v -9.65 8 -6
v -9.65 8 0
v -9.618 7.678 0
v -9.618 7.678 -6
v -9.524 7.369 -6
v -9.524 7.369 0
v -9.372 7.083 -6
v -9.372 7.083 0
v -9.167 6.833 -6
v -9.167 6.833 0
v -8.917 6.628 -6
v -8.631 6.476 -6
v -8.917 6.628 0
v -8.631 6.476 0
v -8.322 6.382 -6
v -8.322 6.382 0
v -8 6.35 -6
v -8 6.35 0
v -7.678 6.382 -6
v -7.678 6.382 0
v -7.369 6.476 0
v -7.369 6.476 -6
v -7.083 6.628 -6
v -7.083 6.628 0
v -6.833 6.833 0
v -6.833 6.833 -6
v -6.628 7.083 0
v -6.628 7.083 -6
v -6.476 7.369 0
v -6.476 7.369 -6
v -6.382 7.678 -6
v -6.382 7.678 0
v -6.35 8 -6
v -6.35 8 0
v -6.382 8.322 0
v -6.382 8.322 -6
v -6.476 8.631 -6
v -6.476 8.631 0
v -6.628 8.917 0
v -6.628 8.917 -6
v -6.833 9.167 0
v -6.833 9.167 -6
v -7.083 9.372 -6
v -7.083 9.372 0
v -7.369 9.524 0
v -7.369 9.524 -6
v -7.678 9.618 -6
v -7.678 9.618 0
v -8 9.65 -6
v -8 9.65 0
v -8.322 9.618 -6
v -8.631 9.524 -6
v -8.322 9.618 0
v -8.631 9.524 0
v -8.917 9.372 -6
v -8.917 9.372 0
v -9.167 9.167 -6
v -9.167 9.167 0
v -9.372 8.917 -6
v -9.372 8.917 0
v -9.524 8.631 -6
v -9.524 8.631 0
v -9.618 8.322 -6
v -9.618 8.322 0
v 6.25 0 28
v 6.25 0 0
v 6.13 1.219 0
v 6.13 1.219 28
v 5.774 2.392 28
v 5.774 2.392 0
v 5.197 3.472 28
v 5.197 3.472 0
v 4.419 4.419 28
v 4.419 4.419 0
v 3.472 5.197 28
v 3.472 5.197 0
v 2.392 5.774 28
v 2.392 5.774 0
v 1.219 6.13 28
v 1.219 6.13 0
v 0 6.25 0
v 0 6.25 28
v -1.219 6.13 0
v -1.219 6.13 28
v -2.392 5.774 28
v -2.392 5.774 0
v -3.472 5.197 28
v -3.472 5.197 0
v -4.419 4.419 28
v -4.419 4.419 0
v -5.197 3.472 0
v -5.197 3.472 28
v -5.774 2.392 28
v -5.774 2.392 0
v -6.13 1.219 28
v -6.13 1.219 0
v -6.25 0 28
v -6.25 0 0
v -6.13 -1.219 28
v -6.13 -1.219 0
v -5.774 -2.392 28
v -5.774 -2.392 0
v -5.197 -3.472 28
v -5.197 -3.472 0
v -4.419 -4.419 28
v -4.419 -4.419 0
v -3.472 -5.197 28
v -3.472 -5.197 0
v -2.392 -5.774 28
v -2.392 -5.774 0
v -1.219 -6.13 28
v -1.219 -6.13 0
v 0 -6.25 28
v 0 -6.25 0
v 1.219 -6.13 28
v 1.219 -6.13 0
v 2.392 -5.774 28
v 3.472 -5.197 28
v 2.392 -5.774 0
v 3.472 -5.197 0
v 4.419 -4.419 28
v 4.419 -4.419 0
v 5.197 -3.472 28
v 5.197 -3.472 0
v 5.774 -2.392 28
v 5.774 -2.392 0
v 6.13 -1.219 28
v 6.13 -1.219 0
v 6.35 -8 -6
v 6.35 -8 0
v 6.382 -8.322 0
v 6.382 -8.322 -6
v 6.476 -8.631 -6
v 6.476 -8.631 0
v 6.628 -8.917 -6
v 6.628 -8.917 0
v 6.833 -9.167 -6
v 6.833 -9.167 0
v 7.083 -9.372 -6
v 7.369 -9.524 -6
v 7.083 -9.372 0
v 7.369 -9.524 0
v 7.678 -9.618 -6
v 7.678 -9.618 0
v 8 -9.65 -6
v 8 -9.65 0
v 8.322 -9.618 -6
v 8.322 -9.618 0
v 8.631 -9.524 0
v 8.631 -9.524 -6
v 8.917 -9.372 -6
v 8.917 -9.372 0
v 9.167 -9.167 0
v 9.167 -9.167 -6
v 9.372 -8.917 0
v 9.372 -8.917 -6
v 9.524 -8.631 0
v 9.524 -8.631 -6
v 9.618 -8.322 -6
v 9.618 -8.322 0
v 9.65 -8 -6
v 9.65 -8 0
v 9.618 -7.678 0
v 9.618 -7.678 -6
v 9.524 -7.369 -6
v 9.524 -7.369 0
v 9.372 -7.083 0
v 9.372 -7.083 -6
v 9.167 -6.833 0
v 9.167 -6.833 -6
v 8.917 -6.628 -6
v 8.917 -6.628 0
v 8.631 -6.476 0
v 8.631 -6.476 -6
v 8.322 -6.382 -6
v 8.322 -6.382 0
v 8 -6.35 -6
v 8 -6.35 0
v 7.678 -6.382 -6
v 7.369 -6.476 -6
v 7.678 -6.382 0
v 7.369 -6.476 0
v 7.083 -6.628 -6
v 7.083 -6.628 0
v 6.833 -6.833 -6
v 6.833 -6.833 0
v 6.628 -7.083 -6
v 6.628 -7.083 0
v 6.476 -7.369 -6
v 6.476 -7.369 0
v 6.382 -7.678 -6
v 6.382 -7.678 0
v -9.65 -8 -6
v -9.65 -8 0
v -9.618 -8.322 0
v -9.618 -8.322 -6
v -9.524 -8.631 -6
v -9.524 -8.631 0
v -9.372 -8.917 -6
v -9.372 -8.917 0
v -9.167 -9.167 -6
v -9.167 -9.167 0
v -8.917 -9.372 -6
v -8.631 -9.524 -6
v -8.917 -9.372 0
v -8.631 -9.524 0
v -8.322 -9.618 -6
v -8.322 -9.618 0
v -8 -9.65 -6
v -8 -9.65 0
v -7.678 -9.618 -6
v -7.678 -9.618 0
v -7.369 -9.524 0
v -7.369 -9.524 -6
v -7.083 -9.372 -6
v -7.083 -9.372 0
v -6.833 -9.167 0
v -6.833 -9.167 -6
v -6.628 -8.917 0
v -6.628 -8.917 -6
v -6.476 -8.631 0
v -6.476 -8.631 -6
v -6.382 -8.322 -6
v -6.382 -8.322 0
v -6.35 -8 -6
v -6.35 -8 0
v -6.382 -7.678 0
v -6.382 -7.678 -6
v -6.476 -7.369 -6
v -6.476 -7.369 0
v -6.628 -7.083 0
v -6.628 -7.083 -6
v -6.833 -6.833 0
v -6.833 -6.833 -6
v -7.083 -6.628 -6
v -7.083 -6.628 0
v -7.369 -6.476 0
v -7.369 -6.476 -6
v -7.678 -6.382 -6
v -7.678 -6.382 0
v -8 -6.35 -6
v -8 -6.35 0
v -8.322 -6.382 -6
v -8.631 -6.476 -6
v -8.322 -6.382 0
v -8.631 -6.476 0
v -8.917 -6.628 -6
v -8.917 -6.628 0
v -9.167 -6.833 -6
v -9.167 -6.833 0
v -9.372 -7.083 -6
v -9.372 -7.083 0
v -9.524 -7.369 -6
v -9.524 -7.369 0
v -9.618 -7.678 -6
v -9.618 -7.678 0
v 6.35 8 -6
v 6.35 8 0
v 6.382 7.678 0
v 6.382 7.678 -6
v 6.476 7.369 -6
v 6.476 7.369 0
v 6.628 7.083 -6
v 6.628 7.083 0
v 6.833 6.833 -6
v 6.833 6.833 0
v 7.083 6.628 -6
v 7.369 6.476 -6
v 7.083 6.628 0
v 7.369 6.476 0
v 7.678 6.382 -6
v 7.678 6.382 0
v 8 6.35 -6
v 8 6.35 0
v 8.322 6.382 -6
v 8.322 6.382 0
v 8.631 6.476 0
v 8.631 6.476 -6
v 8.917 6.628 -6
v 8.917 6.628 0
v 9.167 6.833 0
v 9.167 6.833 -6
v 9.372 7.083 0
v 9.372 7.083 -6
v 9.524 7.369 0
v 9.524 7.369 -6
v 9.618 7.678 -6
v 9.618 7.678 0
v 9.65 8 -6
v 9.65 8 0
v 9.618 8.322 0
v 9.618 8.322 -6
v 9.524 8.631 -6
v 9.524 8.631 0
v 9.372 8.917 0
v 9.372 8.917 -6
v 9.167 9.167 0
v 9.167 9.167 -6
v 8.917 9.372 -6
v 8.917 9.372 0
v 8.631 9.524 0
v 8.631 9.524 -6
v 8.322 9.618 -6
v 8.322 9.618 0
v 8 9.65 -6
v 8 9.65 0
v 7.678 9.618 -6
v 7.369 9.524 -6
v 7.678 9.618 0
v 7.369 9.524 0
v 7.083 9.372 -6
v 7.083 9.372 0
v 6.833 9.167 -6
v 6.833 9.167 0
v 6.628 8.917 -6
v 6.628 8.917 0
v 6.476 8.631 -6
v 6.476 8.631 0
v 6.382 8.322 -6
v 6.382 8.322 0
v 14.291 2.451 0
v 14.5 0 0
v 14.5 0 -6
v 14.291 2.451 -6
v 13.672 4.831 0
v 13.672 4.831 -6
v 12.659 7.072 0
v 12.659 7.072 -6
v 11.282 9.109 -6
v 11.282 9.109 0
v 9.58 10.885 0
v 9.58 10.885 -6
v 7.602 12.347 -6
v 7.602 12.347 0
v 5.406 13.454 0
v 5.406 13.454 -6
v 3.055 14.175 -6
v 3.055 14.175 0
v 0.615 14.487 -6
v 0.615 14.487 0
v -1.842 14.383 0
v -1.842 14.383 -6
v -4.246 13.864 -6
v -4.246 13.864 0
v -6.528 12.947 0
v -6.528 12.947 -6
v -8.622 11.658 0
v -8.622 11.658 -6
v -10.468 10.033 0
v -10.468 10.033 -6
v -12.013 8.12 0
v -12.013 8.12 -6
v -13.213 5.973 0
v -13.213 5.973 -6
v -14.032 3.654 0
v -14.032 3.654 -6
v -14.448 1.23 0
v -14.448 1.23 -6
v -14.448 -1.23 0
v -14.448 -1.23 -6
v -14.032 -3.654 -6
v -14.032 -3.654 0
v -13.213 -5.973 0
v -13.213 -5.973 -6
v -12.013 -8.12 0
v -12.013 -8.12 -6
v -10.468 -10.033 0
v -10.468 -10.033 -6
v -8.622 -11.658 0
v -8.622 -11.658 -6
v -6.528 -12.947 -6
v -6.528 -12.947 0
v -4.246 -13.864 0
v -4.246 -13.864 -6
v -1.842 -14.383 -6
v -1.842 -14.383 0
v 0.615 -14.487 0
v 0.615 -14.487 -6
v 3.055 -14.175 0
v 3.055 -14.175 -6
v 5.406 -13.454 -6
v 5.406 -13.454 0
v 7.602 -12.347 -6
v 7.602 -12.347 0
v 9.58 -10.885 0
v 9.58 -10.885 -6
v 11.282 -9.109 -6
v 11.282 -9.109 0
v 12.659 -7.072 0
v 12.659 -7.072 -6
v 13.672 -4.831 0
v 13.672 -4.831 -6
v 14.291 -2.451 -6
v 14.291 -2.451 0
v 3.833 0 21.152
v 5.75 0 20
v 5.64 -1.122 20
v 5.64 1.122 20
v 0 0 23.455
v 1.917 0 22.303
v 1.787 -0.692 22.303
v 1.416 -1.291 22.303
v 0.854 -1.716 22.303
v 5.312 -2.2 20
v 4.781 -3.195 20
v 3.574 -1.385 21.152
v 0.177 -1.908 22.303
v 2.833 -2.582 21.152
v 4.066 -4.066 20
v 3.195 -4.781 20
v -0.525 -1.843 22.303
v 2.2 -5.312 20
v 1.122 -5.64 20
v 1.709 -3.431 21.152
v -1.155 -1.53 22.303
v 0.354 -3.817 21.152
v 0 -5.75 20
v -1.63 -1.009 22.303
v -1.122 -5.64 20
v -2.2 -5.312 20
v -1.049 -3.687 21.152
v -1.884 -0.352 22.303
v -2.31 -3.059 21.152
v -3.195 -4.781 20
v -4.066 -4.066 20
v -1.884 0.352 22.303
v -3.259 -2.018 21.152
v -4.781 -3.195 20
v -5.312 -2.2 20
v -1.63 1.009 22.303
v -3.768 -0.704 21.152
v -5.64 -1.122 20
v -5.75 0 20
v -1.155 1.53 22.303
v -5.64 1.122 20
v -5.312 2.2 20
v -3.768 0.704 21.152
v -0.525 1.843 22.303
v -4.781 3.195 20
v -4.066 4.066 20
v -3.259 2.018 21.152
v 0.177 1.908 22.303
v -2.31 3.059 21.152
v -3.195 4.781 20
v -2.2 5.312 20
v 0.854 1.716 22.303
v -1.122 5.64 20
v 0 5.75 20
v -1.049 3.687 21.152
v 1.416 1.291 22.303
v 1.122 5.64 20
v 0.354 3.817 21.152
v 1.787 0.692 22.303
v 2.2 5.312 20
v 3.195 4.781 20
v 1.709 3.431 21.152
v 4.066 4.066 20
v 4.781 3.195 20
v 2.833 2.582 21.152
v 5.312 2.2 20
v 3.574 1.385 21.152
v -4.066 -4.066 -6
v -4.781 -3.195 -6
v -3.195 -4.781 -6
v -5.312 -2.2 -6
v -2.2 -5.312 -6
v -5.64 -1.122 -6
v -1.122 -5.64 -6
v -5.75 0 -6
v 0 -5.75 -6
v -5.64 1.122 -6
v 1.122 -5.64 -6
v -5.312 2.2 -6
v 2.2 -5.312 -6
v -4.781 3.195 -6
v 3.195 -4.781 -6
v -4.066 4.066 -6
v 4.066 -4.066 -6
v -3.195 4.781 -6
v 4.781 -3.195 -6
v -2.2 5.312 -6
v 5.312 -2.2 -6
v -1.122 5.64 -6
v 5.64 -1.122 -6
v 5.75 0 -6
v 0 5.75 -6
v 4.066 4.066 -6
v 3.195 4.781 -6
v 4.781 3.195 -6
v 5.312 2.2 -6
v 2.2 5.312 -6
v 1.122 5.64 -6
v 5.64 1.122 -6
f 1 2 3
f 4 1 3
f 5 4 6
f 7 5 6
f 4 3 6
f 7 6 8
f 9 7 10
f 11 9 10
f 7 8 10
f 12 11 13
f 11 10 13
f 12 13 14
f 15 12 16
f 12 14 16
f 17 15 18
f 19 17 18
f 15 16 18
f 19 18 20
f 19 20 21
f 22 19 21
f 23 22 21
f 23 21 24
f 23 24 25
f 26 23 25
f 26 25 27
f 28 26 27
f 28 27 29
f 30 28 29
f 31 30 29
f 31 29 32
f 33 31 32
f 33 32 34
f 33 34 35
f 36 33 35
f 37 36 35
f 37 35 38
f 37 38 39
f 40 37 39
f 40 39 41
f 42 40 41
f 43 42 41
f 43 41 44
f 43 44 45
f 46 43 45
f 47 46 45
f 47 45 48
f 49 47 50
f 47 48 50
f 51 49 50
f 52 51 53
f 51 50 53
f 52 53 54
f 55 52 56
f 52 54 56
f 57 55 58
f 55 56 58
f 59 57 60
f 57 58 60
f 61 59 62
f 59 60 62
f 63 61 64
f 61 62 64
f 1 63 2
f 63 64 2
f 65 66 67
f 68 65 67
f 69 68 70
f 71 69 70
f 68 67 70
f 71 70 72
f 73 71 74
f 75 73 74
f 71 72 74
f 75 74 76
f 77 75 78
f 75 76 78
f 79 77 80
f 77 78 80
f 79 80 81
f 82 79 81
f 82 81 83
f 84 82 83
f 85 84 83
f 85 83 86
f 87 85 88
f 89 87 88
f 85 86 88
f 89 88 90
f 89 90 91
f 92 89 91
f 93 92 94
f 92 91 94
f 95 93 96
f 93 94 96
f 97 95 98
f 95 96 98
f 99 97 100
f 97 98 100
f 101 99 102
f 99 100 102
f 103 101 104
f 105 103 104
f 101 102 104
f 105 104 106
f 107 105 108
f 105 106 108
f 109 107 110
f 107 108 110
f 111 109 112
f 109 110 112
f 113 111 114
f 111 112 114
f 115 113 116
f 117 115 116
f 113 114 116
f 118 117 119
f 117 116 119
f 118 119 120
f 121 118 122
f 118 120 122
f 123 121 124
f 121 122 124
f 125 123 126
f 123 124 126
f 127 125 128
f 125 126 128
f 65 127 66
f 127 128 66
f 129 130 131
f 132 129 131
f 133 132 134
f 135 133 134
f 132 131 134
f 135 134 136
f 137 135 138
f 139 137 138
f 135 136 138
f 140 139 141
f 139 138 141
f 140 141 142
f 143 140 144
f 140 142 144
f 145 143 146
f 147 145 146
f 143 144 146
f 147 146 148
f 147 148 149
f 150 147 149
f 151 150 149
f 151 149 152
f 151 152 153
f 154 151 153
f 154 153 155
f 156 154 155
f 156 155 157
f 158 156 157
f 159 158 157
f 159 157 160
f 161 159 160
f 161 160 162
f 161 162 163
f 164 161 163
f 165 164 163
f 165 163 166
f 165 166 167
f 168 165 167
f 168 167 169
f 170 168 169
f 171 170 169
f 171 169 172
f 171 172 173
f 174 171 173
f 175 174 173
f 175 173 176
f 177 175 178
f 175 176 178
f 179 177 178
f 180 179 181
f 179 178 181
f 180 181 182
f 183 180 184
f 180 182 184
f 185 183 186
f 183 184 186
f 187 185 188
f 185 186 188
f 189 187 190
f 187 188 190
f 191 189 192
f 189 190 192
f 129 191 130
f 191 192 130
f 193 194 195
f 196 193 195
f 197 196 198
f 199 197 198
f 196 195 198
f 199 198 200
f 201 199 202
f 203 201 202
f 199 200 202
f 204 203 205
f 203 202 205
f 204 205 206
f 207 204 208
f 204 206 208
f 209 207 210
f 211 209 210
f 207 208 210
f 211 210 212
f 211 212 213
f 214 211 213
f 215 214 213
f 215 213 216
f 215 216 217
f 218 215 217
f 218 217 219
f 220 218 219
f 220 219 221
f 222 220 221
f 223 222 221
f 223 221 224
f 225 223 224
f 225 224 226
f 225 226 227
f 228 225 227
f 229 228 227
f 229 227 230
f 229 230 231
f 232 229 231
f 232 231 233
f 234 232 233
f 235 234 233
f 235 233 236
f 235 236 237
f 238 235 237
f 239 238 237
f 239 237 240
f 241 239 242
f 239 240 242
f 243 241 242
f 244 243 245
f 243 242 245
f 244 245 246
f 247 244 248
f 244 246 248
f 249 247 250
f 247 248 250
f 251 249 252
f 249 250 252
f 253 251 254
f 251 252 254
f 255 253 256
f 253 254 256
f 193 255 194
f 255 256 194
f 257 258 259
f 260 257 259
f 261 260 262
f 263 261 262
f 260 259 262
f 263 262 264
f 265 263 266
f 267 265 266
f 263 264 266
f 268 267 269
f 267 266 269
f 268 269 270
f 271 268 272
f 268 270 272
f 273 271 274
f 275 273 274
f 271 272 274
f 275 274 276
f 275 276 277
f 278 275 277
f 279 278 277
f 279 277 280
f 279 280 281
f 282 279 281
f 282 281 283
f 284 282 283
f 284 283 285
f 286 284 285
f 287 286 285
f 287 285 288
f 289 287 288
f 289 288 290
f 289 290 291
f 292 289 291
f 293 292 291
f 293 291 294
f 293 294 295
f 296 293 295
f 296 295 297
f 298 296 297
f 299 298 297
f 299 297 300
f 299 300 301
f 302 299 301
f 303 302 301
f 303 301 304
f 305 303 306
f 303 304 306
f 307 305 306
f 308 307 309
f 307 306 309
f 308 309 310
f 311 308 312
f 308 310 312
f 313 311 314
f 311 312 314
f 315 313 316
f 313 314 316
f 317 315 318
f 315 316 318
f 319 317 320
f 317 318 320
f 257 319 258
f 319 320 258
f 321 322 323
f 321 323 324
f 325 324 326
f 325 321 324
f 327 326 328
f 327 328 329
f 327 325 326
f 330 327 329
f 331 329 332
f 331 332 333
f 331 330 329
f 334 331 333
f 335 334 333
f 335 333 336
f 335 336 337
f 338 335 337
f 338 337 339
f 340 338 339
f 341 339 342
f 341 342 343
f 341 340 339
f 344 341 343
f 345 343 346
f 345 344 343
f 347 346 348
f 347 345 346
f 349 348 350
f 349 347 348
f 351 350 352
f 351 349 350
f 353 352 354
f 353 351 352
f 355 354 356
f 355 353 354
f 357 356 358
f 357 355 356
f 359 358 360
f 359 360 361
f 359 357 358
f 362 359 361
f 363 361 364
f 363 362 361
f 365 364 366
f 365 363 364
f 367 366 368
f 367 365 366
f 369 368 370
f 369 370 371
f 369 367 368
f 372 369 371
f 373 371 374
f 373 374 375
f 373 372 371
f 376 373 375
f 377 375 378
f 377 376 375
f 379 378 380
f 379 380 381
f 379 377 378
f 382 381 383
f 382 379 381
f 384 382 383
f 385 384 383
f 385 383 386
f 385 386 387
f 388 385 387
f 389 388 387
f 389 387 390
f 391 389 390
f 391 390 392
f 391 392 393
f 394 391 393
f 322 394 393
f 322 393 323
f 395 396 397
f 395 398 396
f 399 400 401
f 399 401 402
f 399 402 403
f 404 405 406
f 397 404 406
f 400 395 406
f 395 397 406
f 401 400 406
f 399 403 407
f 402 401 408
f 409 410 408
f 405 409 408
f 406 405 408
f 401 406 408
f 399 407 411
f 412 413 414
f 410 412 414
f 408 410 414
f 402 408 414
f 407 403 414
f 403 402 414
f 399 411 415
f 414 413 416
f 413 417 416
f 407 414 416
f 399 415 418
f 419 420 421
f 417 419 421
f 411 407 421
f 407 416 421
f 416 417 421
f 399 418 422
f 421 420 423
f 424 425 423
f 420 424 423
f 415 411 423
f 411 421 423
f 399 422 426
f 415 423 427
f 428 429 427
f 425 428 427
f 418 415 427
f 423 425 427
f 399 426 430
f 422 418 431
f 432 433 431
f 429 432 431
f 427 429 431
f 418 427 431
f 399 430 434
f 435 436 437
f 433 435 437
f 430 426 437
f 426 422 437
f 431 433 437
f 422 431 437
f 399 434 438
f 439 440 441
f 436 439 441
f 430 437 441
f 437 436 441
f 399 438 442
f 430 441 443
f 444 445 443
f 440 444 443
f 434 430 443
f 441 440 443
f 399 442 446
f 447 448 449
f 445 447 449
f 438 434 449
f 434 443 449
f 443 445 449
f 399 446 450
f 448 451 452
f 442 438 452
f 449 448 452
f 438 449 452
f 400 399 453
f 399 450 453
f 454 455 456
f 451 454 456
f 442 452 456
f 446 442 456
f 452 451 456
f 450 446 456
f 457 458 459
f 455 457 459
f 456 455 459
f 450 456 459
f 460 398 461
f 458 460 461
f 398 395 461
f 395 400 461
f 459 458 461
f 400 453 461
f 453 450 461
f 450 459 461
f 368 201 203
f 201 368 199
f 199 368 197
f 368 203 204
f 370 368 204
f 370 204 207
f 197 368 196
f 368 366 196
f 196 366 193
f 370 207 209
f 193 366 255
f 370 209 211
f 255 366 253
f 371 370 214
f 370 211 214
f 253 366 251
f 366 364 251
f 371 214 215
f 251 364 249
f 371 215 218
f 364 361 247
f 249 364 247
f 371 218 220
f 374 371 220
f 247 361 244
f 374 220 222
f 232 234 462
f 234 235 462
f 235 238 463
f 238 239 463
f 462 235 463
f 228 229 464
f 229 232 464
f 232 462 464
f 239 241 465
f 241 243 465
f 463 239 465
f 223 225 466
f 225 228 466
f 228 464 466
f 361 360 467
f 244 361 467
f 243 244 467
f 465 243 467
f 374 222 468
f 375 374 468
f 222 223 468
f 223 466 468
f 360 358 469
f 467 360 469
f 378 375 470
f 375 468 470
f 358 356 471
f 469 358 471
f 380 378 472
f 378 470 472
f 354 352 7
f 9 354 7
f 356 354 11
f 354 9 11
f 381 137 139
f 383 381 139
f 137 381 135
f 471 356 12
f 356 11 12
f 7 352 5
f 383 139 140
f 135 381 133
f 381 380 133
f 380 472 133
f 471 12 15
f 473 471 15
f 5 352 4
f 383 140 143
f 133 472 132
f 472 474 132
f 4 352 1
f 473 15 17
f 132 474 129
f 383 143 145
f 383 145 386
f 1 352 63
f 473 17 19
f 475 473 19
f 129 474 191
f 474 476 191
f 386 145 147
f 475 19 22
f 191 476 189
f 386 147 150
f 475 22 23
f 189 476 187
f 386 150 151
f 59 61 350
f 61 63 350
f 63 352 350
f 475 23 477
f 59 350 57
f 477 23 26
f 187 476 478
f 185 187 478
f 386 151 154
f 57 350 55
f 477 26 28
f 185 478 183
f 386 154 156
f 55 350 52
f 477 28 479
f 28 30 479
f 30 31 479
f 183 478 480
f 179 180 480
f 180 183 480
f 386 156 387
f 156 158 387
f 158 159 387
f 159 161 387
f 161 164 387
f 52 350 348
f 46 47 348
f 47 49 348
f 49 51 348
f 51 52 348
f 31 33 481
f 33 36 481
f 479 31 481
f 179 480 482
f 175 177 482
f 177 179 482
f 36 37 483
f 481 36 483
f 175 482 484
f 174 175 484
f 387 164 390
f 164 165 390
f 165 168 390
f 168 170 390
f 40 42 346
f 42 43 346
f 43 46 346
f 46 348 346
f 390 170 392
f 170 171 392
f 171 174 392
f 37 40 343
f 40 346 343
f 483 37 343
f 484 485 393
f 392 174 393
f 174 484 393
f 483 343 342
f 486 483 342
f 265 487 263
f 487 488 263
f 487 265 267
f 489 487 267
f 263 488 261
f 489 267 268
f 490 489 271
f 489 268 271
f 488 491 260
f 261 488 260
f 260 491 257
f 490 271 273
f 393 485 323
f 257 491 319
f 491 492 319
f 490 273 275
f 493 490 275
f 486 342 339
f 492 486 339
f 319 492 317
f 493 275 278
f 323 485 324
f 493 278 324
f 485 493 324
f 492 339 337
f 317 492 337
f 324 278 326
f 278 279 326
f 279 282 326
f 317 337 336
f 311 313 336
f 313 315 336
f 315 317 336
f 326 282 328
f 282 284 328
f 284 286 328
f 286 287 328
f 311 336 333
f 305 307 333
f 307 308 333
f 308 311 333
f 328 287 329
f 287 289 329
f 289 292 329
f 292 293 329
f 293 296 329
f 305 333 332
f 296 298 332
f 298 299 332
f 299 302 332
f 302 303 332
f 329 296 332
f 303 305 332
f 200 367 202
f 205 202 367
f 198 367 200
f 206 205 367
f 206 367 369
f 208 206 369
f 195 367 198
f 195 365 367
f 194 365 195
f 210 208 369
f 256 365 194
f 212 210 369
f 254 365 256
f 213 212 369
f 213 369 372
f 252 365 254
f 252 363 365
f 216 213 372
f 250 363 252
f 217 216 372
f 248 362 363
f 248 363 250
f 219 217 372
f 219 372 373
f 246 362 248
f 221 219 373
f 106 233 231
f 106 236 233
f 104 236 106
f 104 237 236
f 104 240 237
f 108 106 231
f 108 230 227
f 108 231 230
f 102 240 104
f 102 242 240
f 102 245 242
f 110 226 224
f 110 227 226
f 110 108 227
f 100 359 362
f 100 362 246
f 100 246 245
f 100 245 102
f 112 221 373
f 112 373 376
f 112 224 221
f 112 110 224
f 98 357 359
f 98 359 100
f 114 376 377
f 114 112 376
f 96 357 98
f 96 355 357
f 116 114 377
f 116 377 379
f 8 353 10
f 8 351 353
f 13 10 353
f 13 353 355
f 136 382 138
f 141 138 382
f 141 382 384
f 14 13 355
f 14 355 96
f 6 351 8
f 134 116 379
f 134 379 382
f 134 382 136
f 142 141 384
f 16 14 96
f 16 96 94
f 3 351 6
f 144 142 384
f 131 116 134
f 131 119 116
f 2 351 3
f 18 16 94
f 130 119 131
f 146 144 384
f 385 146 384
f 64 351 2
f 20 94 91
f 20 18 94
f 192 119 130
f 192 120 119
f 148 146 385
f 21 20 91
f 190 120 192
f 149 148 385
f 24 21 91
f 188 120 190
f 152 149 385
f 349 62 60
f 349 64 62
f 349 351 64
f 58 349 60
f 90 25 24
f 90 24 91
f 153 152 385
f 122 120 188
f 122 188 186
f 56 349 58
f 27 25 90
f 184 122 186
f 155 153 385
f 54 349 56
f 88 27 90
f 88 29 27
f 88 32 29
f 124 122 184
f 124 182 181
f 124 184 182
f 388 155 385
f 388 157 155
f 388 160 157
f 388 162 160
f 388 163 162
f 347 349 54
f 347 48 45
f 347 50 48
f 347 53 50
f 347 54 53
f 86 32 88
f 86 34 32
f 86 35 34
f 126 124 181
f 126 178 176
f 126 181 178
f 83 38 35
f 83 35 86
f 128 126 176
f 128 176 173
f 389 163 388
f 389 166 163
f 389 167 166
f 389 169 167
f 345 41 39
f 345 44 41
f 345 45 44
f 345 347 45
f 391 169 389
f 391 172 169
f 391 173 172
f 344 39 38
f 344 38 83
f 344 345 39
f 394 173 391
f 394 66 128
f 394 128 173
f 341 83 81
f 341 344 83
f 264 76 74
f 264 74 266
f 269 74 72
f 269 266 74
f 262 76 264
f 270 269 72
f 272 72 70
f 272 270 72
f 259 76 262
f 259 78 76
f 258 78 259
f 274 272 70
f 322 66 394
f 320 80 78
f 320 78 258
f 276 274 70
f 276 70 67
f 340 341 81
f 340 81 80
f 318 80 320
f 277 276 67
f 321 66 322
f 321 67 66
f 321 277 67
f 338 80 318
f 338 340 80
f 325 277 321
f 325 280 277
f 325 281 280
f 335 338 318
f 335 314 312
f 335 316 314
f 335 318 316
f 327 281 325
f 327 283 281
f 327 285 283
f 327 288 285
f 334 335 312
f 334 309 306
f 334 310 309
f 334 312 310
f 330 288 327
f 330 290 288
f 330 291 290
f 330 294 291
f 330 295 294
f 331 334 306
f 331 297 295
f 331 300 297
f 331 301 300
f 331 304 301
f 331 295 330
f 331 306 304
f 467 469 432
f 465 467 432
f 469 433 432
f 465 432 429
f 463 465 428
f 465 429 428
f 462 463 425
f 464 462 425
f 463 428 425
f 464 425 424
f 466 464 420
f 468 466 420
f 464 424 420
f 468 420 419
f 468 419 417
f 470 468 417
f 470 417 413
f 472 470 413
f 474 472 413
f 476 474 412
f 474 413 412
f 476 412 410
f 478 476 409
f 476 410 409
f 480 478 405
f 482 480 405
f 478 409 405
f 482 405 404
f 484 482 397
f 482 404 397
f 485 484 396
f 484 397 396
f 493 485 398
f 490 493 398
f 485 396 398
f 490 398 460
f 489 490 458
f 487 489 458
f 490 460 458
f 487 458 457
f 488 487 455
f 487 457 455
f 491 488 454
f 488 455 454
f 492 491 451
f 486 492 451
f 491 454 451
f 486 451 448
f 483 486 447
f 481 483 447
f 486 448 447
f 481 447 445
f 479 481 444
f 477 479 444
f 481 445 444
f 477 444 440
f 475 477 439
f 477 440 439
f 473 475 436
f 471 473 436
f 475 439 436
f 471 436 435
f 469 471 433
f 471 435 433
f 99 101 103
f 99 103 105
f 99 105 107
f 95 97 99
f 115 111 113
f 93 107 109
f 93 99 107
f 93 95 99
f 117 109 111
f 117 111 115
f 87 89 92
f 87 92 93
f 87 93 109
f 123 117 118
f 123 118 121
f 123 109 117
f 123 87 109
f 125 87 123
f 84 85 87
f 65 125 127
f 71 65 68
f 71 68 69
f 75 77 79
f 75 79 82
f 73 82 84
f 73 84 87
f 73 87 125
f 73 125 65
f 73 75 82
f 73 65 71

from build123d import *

# Parameters (mm, degrees)
F0_R     = 14.5
F0_R_2   = 6.25
F1_DEPTH = 6
F2_DEPTH = 28
F4_D     = 3.3
F5_D     = 11.5
F5_DEPTH = 26
F5_TIP   = 3.4549485594


with BuildPart() as f1:
    # F0 (on Top) → F1 (new body)
    with BuildSketch(Plane.XY):
        Circle(F0_R)
        Circle(F0_R_2, mode=Mode.SUBTRACT)
        Circle(F0_R_2)
    extrude(amount=-F1_DEPTH)

    # F0 (on Top) → F2 (join)
    with BuildSketch(Plane.XY):
        Circle(F0_R_2)
    extrude(amount=F2_DEPTH)

    # F4 (through all)
    with Locations(Plane(origin=(0, 0, -6), x_dir=(1, 0, 0), z_dir=(0, 0, -1))):
        with Locations((8, 8), (8, -8), (-8, -8), (-8, 8)):
            Hole(F4_D / 2)

    # F5
    with Locations(Plane(origin=(0, 0, -6), x_dir=(1, 0, 0), z_dir=(0, 0, -1))):
        with Locations((0, 0)):
            Hole(F5_D / 2, depth=F5_DEPTH)
            with Locations((0, 0, -(F5_DEPTH + F5_TIP / 2))):  # 118° drill point
                Cone(0, F5_D / 2, F5_TIP, mode=Mode.SUBTRACT)


solid = f1.part
